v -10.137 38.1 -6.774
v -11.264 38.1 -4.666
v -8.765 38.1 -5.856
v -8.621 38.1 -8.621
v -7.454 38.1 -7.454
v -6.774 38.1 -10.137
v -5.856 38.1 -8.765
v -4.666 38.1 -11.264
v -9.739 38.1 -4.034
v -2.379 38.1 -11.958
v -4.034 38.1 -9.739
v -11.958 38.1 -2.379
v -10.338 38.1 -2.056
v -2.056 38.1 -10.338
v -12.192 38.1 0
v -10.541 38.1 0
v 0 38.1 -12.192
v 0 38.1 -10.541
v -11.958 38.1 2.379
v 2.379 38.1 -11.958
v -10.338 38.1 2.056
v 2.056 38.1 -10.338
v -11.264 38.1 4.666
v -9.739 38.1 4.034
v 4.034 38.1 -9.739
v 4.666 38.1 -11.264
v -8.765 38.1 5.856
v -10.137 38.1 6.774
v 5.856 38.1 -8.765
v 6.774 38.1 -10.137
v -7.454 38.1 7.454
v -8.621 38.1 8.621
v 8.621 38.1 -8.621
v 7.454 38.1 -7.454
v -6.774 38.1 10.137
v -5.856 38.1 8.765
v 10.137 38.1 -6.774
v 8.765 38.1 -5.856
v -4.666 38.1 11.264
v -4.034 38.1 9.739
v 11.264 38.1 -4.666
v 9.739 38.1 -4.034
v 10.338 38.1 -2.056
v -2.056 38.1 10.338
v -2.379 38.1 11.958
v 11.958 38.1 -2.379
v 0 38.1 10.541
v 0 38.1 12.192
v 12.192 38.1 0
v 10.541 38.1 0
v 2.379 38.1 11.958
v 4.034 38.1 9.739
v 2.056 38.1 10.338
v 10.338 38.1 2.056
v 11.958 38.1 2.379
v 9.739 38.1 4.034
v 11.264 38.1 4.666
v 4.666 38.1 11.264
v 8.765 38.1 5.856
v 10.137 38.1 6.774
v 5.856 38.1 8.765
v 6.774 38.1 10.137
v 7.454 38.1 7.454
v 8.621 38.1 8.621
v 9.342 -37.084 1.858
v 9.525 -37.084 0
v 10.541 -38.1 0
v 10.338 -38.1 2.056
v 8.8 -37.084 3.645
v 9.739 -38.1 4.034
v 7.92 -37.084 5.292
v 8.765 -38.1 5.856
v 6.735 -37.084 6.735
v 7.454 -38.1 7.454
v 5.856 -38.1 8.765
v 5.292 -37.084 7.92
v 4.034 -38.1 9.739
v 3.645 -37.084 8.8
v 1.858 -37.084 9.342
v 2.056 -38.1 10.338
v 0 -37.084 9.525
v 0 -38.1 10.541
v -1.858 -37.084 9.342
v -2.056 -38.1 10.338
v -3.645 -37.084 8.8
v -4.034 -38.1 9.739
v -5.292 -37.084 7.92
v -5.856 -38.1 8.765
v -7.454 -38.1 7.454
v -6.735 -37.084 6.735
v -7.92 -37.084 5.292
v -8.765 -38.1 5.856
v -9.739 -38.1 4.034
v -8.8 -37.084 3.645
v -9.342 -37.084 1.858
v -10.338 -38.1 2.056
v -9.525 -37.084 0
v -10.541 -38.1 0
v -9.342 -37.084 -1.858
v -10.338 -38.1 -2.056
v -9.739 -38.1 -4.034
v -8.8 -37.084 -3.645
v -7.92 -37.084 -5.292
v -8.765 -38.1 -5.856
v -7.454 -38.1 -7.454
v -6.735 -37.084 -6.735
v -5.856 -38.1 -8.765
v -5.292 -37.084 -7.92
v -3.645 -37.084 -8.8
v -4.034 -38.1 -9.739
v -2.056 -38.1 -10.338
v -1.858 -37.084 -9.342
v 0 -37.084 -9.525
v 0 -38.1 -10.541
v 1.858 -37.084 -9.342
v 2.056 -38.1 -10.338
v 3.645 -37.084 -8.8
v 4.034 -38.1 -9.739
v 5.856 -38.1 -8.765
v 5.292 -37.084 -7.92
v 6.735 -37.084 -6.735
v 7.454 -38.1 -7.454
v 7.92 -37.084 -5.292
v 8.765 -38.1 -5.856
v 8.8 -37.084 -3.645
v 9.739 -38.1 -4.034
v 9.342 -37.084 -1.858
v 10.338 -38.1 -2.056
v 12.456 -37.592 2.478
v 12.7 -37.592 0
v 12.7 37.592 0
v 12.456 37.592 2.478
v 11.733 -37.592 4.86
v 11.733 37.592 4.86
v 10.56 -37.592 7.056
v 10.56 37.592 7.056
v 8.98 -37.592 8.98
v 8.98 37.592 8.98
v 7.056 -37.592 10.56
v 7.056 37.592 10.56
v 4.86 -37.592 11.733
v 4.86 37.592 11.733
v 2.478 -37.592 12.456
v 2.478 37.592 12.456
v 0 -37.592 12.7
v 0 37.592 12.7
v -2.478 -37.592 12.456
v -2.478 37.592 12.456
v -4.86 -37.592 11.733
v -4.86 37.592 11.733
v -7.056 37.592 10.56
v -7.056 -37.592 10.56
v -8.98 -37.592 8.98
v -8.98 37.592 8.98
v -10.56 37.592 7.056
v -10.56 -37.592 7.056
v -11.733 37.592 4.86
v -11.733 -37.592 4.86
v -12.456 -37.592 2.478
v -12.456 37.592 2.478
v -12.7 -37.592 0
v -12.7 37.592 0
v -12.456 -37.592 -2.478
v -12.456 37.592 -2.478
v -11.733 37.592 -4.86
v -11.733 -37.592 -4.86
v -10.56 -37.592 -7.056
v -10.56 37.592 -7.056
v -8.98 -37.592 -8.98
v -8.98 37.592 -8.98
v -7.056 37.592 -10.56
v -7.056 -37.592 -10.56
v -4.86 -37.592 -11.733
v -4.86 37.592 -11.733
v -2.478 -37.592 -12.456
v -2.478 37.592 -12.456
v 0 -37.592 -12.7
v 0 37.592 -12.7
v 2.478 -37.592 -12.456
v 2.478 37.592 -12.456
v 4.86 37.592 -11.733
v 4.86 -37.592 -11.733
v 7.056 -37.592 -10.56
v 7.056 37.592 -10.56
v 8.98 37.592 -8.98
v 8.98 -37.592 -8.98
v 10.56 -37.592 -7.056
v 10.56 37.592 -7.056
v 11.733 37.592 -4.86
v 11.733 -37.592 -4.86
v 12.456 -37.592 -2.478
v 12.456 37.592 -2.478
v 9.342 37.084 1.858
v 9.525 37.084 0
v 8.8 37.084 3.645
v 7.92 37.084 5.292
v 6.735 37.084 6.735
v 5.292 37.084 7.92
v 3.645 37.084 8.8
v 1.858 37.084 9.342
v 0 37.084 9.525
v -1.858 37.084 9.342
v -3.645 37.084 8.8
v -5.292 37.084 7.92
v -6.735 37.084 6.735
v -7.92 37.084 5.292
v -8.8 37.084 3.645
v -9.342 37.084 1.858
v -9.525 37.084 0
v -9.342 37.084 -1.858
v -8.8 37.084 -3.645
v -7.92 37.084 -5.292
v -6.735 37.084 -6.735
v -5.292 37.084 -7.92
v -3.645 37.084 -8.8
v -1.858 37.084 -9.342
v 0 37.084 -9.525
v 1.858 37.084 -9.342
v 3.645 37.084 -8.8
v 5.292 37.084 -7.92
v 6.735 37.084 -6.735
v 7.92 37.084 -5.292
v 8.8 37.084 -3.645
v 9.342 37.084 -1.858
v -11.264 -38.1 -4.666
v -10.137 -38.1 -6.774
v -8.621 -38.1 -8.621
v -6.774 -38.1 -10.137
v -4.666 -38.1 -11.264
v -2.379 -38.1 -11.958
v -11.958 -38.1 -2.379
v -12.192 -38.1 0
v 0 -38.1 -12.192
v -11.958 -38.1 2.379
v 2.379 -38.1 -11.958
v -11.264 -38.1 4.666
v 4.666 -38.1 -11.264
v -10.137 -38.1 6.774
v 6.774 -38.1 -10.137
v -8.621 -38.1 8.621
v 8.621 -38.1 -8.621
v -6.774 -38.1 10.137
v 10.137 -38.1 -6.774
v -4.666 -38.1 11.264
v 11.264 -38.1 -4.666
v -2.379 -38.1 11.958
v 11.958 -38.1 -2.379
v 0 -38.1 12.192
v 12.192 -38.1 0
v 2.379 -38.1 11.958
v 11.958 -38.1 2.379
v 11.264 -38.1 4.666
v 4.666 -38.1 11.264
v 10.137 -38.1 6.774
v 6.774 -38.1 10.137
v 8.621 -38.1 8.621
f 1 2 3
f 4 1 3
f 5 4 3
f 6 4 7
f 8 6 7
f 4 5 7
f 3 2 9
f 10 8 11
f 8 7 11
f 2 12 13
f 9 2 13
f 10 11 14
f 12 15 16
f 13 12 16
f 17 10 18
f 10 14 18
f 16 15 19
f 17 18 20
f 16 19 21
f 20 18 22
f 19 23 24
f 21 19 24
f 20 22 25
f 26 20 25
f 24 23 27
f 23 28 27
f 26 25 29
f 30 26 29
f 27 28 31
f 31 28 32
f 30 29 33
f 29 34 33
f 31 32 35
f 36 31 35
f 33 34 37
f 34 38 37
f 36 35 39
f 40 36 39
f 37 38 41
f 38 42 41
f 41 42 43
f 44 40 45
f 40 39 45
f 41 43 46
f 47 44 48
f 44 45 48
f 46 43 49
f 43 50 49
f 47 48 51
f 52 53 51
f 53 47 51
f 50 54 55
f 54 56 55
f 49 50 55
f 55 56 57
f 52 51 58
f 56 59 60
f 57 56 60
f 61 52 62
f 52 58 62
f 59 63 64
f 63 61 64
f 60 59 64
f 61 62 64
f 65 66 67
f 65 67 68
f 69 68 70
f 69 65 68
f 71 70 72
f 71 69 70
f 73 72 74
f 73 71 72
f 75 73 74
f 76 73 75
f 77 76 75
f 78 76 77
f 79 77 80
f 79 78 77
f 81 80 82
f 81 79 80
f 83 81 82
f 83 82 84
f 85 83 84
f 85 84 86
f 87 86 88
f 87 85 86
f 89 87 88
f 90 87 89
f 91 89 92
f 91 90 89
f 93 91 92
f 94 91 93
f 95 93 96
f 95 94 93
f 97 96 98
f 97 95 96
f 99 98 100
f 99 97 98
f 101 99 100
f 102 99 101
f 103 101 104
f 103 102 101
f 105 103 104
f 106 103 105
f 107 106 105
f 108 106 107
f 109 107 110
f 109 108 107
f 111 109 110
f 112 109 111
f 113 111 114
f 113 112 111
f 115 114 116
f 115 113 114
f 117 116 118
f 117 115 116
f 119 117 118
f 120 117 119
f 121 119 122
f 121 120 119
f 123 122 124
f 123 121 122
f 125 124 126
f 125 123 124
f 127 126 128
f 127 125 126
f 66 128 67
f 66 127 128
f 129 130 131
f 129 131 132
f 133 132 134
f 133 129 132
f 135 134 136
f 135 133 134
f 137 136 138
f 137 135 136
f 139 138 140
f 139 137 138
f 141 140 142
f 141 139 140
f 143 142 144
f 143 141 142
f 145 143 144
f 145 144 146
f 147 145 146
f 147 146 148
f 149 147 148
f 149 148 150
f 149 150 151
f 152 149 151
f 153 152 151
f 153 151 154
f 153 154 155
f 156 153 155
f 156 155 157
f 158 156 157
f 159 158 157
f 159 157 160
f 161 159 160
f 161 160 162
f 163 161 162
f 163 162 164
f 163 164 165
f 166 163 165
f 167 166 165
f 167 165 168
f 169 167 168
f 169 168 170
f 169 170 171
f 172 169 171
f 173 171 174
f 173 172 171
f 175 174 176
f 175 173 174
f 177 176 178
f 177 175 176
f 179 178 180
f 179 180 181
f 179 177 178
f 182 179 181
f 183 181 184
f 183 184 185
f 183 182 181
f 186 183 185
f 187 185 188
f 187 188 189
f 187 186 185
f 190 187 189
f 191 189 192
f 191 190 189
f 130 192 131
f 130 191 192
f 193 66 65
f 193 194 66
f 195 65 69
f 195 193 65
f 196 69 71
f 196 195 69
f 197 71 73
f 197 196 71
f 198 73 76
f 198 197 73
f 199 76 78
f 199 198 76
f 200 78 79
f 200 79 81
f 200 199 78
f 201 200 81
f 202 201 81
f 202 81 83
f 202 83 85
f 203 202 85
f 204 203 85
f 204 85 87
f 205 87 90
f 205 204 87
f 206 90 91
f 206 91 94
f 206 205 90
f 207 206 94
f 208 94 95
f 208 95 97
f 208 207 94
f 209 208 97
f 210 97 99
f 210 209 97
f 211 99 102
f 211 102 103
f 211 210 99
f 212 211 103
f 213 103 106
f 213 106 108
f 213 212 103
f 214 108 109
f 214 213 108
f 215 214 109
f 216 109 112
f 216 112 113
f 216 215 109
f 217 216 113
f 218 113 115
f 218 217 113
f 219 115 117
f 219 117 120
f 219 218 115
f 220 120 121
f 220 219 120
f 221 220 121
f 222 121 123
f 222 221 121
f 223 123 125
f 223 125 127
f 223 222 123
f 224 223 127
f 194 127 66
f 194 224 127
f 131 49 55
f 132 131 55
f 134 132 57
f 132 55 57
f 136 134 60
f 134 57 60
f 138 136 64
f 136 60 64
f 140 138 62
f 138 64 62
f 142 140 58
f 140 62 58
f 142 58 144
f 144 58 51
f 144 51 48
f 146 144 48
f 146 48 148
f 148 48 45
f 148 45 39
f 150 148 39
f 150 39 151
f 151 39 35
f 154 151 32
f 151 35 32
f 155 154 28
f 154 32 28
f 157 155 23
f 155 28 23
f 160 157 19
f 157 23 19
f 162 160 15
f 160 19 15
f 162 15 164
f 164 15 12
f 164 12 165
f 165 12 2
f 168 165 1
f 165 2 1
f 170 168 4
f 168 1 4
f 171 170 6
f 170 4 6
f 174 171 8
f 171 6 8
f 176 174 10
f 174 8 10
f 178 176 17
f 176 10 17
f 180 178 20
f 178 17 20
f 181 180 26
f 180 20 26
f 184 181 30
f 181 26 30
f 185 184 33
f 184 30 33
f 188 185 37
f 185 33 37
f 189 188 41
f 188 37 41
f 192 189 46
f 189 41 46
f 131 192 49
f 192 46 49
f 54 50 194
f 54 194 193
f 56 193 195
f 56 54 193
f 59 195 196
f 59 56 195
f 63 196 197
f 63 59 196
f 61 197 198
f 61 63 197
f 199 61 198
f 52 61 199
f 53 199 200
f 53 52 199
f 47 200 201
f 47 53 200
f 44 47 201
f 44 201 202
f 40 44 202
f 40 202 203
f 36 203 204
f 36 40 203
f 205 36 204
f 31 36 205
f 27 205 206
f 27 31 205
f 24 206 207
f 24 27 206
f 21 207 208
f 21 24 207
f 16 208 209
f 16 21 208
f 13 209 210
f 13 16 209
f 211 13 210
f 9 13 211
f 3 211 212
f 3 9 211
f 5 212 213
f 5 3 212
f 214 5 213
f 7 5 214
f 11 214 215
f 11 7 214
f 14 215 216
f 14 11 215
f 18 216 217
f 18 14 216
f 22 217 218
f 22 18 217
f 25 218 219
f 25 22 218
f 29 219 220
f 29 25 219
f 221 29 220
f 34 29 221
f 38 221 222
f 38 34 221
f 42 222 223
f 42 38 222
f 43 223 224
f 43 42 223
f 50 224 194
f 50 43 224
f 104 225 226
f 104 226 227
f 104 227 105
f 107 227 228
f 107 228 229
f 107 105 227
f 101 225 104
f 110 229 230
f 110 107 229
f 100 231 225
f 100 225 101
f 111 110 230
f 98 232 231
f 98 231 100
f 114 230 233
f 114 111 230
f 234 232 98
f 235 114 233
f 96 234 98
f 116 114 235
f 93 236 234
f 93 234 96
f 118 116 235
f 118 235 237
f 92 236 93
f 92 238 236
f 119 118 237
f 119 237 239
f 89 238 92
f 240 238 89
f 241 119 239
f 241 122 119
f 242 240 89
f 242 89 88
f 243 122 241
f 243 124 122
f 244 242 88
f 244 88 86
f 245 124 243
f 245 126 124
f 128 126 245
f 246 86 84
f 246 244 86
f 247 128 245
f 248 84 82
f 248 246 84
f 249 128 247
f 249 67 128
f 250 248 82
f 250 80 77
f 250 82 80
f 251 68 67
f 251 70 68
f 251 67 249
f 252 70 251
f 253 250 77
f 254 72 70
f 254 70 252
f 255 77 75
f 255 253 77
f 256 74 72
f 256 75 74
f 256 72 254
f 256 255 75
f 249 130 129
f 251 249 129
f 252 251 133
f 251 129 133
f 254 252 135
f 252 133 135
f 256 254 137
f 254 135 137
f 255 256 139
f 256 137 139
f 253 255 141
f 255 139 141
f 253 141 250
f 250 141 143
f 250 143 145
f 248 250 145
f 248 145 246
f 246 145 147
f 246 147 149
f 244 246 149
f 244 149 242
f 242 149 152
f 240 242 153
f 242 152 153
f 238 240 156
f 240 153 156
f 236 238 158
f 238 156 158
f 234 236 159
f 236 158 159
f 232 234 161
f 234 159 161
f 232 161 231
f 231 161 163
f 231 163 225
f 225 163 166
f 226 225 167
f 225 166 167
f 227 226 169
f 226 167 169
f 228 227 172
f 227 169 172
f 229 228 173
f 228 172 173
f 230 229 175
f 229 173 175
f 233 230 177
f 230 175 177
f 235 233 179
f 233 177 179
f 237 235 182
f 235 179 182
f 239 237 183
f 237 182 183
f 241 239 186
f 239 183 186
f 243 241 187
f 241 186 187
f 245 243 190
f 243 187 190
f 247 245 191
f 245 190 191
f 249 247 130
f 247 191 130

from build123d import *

# Parameters (mm, degrees)
F0_R          = 12.7
F0_R_2        = 9.525
F1_DEPTH      = 38.1
F1_DEPTH_BACK = 38.1
F2_SIZE       = 1.016
F3_SIZE       = 0.508


with BuildPart() as f1:
    # F0 (on Front) → F1 (new body, two sides)
    with BuildSketch(Plane.XZ) as f1_sk:
        Circle(F0_R)
        Circle(F0_R_2, mode=Mode.SUBTRACT)
    extrude(amount=F1_DEPTH)
    extrude(f1_sk.sketch, amount=-F1_DEPTH_BACK)

    # F2
    f2_edges = [f1.edges().sort_by_distance(p)[0] for p in [
        (-9.525, -38.1, 0),
        (-9.525, 38.1, 0),
    ]]
    chamfer(f2_edges, length=F2_SIZE)

    # F3
    f3_edges = [f1.edges().sort_by_distance(p)[0] for p in [
        (-12.7, 38.1, 0),
        (-12.7, -38.1, 0),
    ]]
    chamfer(f3_edges, length=F3_SIZE)


solid = f1.part
